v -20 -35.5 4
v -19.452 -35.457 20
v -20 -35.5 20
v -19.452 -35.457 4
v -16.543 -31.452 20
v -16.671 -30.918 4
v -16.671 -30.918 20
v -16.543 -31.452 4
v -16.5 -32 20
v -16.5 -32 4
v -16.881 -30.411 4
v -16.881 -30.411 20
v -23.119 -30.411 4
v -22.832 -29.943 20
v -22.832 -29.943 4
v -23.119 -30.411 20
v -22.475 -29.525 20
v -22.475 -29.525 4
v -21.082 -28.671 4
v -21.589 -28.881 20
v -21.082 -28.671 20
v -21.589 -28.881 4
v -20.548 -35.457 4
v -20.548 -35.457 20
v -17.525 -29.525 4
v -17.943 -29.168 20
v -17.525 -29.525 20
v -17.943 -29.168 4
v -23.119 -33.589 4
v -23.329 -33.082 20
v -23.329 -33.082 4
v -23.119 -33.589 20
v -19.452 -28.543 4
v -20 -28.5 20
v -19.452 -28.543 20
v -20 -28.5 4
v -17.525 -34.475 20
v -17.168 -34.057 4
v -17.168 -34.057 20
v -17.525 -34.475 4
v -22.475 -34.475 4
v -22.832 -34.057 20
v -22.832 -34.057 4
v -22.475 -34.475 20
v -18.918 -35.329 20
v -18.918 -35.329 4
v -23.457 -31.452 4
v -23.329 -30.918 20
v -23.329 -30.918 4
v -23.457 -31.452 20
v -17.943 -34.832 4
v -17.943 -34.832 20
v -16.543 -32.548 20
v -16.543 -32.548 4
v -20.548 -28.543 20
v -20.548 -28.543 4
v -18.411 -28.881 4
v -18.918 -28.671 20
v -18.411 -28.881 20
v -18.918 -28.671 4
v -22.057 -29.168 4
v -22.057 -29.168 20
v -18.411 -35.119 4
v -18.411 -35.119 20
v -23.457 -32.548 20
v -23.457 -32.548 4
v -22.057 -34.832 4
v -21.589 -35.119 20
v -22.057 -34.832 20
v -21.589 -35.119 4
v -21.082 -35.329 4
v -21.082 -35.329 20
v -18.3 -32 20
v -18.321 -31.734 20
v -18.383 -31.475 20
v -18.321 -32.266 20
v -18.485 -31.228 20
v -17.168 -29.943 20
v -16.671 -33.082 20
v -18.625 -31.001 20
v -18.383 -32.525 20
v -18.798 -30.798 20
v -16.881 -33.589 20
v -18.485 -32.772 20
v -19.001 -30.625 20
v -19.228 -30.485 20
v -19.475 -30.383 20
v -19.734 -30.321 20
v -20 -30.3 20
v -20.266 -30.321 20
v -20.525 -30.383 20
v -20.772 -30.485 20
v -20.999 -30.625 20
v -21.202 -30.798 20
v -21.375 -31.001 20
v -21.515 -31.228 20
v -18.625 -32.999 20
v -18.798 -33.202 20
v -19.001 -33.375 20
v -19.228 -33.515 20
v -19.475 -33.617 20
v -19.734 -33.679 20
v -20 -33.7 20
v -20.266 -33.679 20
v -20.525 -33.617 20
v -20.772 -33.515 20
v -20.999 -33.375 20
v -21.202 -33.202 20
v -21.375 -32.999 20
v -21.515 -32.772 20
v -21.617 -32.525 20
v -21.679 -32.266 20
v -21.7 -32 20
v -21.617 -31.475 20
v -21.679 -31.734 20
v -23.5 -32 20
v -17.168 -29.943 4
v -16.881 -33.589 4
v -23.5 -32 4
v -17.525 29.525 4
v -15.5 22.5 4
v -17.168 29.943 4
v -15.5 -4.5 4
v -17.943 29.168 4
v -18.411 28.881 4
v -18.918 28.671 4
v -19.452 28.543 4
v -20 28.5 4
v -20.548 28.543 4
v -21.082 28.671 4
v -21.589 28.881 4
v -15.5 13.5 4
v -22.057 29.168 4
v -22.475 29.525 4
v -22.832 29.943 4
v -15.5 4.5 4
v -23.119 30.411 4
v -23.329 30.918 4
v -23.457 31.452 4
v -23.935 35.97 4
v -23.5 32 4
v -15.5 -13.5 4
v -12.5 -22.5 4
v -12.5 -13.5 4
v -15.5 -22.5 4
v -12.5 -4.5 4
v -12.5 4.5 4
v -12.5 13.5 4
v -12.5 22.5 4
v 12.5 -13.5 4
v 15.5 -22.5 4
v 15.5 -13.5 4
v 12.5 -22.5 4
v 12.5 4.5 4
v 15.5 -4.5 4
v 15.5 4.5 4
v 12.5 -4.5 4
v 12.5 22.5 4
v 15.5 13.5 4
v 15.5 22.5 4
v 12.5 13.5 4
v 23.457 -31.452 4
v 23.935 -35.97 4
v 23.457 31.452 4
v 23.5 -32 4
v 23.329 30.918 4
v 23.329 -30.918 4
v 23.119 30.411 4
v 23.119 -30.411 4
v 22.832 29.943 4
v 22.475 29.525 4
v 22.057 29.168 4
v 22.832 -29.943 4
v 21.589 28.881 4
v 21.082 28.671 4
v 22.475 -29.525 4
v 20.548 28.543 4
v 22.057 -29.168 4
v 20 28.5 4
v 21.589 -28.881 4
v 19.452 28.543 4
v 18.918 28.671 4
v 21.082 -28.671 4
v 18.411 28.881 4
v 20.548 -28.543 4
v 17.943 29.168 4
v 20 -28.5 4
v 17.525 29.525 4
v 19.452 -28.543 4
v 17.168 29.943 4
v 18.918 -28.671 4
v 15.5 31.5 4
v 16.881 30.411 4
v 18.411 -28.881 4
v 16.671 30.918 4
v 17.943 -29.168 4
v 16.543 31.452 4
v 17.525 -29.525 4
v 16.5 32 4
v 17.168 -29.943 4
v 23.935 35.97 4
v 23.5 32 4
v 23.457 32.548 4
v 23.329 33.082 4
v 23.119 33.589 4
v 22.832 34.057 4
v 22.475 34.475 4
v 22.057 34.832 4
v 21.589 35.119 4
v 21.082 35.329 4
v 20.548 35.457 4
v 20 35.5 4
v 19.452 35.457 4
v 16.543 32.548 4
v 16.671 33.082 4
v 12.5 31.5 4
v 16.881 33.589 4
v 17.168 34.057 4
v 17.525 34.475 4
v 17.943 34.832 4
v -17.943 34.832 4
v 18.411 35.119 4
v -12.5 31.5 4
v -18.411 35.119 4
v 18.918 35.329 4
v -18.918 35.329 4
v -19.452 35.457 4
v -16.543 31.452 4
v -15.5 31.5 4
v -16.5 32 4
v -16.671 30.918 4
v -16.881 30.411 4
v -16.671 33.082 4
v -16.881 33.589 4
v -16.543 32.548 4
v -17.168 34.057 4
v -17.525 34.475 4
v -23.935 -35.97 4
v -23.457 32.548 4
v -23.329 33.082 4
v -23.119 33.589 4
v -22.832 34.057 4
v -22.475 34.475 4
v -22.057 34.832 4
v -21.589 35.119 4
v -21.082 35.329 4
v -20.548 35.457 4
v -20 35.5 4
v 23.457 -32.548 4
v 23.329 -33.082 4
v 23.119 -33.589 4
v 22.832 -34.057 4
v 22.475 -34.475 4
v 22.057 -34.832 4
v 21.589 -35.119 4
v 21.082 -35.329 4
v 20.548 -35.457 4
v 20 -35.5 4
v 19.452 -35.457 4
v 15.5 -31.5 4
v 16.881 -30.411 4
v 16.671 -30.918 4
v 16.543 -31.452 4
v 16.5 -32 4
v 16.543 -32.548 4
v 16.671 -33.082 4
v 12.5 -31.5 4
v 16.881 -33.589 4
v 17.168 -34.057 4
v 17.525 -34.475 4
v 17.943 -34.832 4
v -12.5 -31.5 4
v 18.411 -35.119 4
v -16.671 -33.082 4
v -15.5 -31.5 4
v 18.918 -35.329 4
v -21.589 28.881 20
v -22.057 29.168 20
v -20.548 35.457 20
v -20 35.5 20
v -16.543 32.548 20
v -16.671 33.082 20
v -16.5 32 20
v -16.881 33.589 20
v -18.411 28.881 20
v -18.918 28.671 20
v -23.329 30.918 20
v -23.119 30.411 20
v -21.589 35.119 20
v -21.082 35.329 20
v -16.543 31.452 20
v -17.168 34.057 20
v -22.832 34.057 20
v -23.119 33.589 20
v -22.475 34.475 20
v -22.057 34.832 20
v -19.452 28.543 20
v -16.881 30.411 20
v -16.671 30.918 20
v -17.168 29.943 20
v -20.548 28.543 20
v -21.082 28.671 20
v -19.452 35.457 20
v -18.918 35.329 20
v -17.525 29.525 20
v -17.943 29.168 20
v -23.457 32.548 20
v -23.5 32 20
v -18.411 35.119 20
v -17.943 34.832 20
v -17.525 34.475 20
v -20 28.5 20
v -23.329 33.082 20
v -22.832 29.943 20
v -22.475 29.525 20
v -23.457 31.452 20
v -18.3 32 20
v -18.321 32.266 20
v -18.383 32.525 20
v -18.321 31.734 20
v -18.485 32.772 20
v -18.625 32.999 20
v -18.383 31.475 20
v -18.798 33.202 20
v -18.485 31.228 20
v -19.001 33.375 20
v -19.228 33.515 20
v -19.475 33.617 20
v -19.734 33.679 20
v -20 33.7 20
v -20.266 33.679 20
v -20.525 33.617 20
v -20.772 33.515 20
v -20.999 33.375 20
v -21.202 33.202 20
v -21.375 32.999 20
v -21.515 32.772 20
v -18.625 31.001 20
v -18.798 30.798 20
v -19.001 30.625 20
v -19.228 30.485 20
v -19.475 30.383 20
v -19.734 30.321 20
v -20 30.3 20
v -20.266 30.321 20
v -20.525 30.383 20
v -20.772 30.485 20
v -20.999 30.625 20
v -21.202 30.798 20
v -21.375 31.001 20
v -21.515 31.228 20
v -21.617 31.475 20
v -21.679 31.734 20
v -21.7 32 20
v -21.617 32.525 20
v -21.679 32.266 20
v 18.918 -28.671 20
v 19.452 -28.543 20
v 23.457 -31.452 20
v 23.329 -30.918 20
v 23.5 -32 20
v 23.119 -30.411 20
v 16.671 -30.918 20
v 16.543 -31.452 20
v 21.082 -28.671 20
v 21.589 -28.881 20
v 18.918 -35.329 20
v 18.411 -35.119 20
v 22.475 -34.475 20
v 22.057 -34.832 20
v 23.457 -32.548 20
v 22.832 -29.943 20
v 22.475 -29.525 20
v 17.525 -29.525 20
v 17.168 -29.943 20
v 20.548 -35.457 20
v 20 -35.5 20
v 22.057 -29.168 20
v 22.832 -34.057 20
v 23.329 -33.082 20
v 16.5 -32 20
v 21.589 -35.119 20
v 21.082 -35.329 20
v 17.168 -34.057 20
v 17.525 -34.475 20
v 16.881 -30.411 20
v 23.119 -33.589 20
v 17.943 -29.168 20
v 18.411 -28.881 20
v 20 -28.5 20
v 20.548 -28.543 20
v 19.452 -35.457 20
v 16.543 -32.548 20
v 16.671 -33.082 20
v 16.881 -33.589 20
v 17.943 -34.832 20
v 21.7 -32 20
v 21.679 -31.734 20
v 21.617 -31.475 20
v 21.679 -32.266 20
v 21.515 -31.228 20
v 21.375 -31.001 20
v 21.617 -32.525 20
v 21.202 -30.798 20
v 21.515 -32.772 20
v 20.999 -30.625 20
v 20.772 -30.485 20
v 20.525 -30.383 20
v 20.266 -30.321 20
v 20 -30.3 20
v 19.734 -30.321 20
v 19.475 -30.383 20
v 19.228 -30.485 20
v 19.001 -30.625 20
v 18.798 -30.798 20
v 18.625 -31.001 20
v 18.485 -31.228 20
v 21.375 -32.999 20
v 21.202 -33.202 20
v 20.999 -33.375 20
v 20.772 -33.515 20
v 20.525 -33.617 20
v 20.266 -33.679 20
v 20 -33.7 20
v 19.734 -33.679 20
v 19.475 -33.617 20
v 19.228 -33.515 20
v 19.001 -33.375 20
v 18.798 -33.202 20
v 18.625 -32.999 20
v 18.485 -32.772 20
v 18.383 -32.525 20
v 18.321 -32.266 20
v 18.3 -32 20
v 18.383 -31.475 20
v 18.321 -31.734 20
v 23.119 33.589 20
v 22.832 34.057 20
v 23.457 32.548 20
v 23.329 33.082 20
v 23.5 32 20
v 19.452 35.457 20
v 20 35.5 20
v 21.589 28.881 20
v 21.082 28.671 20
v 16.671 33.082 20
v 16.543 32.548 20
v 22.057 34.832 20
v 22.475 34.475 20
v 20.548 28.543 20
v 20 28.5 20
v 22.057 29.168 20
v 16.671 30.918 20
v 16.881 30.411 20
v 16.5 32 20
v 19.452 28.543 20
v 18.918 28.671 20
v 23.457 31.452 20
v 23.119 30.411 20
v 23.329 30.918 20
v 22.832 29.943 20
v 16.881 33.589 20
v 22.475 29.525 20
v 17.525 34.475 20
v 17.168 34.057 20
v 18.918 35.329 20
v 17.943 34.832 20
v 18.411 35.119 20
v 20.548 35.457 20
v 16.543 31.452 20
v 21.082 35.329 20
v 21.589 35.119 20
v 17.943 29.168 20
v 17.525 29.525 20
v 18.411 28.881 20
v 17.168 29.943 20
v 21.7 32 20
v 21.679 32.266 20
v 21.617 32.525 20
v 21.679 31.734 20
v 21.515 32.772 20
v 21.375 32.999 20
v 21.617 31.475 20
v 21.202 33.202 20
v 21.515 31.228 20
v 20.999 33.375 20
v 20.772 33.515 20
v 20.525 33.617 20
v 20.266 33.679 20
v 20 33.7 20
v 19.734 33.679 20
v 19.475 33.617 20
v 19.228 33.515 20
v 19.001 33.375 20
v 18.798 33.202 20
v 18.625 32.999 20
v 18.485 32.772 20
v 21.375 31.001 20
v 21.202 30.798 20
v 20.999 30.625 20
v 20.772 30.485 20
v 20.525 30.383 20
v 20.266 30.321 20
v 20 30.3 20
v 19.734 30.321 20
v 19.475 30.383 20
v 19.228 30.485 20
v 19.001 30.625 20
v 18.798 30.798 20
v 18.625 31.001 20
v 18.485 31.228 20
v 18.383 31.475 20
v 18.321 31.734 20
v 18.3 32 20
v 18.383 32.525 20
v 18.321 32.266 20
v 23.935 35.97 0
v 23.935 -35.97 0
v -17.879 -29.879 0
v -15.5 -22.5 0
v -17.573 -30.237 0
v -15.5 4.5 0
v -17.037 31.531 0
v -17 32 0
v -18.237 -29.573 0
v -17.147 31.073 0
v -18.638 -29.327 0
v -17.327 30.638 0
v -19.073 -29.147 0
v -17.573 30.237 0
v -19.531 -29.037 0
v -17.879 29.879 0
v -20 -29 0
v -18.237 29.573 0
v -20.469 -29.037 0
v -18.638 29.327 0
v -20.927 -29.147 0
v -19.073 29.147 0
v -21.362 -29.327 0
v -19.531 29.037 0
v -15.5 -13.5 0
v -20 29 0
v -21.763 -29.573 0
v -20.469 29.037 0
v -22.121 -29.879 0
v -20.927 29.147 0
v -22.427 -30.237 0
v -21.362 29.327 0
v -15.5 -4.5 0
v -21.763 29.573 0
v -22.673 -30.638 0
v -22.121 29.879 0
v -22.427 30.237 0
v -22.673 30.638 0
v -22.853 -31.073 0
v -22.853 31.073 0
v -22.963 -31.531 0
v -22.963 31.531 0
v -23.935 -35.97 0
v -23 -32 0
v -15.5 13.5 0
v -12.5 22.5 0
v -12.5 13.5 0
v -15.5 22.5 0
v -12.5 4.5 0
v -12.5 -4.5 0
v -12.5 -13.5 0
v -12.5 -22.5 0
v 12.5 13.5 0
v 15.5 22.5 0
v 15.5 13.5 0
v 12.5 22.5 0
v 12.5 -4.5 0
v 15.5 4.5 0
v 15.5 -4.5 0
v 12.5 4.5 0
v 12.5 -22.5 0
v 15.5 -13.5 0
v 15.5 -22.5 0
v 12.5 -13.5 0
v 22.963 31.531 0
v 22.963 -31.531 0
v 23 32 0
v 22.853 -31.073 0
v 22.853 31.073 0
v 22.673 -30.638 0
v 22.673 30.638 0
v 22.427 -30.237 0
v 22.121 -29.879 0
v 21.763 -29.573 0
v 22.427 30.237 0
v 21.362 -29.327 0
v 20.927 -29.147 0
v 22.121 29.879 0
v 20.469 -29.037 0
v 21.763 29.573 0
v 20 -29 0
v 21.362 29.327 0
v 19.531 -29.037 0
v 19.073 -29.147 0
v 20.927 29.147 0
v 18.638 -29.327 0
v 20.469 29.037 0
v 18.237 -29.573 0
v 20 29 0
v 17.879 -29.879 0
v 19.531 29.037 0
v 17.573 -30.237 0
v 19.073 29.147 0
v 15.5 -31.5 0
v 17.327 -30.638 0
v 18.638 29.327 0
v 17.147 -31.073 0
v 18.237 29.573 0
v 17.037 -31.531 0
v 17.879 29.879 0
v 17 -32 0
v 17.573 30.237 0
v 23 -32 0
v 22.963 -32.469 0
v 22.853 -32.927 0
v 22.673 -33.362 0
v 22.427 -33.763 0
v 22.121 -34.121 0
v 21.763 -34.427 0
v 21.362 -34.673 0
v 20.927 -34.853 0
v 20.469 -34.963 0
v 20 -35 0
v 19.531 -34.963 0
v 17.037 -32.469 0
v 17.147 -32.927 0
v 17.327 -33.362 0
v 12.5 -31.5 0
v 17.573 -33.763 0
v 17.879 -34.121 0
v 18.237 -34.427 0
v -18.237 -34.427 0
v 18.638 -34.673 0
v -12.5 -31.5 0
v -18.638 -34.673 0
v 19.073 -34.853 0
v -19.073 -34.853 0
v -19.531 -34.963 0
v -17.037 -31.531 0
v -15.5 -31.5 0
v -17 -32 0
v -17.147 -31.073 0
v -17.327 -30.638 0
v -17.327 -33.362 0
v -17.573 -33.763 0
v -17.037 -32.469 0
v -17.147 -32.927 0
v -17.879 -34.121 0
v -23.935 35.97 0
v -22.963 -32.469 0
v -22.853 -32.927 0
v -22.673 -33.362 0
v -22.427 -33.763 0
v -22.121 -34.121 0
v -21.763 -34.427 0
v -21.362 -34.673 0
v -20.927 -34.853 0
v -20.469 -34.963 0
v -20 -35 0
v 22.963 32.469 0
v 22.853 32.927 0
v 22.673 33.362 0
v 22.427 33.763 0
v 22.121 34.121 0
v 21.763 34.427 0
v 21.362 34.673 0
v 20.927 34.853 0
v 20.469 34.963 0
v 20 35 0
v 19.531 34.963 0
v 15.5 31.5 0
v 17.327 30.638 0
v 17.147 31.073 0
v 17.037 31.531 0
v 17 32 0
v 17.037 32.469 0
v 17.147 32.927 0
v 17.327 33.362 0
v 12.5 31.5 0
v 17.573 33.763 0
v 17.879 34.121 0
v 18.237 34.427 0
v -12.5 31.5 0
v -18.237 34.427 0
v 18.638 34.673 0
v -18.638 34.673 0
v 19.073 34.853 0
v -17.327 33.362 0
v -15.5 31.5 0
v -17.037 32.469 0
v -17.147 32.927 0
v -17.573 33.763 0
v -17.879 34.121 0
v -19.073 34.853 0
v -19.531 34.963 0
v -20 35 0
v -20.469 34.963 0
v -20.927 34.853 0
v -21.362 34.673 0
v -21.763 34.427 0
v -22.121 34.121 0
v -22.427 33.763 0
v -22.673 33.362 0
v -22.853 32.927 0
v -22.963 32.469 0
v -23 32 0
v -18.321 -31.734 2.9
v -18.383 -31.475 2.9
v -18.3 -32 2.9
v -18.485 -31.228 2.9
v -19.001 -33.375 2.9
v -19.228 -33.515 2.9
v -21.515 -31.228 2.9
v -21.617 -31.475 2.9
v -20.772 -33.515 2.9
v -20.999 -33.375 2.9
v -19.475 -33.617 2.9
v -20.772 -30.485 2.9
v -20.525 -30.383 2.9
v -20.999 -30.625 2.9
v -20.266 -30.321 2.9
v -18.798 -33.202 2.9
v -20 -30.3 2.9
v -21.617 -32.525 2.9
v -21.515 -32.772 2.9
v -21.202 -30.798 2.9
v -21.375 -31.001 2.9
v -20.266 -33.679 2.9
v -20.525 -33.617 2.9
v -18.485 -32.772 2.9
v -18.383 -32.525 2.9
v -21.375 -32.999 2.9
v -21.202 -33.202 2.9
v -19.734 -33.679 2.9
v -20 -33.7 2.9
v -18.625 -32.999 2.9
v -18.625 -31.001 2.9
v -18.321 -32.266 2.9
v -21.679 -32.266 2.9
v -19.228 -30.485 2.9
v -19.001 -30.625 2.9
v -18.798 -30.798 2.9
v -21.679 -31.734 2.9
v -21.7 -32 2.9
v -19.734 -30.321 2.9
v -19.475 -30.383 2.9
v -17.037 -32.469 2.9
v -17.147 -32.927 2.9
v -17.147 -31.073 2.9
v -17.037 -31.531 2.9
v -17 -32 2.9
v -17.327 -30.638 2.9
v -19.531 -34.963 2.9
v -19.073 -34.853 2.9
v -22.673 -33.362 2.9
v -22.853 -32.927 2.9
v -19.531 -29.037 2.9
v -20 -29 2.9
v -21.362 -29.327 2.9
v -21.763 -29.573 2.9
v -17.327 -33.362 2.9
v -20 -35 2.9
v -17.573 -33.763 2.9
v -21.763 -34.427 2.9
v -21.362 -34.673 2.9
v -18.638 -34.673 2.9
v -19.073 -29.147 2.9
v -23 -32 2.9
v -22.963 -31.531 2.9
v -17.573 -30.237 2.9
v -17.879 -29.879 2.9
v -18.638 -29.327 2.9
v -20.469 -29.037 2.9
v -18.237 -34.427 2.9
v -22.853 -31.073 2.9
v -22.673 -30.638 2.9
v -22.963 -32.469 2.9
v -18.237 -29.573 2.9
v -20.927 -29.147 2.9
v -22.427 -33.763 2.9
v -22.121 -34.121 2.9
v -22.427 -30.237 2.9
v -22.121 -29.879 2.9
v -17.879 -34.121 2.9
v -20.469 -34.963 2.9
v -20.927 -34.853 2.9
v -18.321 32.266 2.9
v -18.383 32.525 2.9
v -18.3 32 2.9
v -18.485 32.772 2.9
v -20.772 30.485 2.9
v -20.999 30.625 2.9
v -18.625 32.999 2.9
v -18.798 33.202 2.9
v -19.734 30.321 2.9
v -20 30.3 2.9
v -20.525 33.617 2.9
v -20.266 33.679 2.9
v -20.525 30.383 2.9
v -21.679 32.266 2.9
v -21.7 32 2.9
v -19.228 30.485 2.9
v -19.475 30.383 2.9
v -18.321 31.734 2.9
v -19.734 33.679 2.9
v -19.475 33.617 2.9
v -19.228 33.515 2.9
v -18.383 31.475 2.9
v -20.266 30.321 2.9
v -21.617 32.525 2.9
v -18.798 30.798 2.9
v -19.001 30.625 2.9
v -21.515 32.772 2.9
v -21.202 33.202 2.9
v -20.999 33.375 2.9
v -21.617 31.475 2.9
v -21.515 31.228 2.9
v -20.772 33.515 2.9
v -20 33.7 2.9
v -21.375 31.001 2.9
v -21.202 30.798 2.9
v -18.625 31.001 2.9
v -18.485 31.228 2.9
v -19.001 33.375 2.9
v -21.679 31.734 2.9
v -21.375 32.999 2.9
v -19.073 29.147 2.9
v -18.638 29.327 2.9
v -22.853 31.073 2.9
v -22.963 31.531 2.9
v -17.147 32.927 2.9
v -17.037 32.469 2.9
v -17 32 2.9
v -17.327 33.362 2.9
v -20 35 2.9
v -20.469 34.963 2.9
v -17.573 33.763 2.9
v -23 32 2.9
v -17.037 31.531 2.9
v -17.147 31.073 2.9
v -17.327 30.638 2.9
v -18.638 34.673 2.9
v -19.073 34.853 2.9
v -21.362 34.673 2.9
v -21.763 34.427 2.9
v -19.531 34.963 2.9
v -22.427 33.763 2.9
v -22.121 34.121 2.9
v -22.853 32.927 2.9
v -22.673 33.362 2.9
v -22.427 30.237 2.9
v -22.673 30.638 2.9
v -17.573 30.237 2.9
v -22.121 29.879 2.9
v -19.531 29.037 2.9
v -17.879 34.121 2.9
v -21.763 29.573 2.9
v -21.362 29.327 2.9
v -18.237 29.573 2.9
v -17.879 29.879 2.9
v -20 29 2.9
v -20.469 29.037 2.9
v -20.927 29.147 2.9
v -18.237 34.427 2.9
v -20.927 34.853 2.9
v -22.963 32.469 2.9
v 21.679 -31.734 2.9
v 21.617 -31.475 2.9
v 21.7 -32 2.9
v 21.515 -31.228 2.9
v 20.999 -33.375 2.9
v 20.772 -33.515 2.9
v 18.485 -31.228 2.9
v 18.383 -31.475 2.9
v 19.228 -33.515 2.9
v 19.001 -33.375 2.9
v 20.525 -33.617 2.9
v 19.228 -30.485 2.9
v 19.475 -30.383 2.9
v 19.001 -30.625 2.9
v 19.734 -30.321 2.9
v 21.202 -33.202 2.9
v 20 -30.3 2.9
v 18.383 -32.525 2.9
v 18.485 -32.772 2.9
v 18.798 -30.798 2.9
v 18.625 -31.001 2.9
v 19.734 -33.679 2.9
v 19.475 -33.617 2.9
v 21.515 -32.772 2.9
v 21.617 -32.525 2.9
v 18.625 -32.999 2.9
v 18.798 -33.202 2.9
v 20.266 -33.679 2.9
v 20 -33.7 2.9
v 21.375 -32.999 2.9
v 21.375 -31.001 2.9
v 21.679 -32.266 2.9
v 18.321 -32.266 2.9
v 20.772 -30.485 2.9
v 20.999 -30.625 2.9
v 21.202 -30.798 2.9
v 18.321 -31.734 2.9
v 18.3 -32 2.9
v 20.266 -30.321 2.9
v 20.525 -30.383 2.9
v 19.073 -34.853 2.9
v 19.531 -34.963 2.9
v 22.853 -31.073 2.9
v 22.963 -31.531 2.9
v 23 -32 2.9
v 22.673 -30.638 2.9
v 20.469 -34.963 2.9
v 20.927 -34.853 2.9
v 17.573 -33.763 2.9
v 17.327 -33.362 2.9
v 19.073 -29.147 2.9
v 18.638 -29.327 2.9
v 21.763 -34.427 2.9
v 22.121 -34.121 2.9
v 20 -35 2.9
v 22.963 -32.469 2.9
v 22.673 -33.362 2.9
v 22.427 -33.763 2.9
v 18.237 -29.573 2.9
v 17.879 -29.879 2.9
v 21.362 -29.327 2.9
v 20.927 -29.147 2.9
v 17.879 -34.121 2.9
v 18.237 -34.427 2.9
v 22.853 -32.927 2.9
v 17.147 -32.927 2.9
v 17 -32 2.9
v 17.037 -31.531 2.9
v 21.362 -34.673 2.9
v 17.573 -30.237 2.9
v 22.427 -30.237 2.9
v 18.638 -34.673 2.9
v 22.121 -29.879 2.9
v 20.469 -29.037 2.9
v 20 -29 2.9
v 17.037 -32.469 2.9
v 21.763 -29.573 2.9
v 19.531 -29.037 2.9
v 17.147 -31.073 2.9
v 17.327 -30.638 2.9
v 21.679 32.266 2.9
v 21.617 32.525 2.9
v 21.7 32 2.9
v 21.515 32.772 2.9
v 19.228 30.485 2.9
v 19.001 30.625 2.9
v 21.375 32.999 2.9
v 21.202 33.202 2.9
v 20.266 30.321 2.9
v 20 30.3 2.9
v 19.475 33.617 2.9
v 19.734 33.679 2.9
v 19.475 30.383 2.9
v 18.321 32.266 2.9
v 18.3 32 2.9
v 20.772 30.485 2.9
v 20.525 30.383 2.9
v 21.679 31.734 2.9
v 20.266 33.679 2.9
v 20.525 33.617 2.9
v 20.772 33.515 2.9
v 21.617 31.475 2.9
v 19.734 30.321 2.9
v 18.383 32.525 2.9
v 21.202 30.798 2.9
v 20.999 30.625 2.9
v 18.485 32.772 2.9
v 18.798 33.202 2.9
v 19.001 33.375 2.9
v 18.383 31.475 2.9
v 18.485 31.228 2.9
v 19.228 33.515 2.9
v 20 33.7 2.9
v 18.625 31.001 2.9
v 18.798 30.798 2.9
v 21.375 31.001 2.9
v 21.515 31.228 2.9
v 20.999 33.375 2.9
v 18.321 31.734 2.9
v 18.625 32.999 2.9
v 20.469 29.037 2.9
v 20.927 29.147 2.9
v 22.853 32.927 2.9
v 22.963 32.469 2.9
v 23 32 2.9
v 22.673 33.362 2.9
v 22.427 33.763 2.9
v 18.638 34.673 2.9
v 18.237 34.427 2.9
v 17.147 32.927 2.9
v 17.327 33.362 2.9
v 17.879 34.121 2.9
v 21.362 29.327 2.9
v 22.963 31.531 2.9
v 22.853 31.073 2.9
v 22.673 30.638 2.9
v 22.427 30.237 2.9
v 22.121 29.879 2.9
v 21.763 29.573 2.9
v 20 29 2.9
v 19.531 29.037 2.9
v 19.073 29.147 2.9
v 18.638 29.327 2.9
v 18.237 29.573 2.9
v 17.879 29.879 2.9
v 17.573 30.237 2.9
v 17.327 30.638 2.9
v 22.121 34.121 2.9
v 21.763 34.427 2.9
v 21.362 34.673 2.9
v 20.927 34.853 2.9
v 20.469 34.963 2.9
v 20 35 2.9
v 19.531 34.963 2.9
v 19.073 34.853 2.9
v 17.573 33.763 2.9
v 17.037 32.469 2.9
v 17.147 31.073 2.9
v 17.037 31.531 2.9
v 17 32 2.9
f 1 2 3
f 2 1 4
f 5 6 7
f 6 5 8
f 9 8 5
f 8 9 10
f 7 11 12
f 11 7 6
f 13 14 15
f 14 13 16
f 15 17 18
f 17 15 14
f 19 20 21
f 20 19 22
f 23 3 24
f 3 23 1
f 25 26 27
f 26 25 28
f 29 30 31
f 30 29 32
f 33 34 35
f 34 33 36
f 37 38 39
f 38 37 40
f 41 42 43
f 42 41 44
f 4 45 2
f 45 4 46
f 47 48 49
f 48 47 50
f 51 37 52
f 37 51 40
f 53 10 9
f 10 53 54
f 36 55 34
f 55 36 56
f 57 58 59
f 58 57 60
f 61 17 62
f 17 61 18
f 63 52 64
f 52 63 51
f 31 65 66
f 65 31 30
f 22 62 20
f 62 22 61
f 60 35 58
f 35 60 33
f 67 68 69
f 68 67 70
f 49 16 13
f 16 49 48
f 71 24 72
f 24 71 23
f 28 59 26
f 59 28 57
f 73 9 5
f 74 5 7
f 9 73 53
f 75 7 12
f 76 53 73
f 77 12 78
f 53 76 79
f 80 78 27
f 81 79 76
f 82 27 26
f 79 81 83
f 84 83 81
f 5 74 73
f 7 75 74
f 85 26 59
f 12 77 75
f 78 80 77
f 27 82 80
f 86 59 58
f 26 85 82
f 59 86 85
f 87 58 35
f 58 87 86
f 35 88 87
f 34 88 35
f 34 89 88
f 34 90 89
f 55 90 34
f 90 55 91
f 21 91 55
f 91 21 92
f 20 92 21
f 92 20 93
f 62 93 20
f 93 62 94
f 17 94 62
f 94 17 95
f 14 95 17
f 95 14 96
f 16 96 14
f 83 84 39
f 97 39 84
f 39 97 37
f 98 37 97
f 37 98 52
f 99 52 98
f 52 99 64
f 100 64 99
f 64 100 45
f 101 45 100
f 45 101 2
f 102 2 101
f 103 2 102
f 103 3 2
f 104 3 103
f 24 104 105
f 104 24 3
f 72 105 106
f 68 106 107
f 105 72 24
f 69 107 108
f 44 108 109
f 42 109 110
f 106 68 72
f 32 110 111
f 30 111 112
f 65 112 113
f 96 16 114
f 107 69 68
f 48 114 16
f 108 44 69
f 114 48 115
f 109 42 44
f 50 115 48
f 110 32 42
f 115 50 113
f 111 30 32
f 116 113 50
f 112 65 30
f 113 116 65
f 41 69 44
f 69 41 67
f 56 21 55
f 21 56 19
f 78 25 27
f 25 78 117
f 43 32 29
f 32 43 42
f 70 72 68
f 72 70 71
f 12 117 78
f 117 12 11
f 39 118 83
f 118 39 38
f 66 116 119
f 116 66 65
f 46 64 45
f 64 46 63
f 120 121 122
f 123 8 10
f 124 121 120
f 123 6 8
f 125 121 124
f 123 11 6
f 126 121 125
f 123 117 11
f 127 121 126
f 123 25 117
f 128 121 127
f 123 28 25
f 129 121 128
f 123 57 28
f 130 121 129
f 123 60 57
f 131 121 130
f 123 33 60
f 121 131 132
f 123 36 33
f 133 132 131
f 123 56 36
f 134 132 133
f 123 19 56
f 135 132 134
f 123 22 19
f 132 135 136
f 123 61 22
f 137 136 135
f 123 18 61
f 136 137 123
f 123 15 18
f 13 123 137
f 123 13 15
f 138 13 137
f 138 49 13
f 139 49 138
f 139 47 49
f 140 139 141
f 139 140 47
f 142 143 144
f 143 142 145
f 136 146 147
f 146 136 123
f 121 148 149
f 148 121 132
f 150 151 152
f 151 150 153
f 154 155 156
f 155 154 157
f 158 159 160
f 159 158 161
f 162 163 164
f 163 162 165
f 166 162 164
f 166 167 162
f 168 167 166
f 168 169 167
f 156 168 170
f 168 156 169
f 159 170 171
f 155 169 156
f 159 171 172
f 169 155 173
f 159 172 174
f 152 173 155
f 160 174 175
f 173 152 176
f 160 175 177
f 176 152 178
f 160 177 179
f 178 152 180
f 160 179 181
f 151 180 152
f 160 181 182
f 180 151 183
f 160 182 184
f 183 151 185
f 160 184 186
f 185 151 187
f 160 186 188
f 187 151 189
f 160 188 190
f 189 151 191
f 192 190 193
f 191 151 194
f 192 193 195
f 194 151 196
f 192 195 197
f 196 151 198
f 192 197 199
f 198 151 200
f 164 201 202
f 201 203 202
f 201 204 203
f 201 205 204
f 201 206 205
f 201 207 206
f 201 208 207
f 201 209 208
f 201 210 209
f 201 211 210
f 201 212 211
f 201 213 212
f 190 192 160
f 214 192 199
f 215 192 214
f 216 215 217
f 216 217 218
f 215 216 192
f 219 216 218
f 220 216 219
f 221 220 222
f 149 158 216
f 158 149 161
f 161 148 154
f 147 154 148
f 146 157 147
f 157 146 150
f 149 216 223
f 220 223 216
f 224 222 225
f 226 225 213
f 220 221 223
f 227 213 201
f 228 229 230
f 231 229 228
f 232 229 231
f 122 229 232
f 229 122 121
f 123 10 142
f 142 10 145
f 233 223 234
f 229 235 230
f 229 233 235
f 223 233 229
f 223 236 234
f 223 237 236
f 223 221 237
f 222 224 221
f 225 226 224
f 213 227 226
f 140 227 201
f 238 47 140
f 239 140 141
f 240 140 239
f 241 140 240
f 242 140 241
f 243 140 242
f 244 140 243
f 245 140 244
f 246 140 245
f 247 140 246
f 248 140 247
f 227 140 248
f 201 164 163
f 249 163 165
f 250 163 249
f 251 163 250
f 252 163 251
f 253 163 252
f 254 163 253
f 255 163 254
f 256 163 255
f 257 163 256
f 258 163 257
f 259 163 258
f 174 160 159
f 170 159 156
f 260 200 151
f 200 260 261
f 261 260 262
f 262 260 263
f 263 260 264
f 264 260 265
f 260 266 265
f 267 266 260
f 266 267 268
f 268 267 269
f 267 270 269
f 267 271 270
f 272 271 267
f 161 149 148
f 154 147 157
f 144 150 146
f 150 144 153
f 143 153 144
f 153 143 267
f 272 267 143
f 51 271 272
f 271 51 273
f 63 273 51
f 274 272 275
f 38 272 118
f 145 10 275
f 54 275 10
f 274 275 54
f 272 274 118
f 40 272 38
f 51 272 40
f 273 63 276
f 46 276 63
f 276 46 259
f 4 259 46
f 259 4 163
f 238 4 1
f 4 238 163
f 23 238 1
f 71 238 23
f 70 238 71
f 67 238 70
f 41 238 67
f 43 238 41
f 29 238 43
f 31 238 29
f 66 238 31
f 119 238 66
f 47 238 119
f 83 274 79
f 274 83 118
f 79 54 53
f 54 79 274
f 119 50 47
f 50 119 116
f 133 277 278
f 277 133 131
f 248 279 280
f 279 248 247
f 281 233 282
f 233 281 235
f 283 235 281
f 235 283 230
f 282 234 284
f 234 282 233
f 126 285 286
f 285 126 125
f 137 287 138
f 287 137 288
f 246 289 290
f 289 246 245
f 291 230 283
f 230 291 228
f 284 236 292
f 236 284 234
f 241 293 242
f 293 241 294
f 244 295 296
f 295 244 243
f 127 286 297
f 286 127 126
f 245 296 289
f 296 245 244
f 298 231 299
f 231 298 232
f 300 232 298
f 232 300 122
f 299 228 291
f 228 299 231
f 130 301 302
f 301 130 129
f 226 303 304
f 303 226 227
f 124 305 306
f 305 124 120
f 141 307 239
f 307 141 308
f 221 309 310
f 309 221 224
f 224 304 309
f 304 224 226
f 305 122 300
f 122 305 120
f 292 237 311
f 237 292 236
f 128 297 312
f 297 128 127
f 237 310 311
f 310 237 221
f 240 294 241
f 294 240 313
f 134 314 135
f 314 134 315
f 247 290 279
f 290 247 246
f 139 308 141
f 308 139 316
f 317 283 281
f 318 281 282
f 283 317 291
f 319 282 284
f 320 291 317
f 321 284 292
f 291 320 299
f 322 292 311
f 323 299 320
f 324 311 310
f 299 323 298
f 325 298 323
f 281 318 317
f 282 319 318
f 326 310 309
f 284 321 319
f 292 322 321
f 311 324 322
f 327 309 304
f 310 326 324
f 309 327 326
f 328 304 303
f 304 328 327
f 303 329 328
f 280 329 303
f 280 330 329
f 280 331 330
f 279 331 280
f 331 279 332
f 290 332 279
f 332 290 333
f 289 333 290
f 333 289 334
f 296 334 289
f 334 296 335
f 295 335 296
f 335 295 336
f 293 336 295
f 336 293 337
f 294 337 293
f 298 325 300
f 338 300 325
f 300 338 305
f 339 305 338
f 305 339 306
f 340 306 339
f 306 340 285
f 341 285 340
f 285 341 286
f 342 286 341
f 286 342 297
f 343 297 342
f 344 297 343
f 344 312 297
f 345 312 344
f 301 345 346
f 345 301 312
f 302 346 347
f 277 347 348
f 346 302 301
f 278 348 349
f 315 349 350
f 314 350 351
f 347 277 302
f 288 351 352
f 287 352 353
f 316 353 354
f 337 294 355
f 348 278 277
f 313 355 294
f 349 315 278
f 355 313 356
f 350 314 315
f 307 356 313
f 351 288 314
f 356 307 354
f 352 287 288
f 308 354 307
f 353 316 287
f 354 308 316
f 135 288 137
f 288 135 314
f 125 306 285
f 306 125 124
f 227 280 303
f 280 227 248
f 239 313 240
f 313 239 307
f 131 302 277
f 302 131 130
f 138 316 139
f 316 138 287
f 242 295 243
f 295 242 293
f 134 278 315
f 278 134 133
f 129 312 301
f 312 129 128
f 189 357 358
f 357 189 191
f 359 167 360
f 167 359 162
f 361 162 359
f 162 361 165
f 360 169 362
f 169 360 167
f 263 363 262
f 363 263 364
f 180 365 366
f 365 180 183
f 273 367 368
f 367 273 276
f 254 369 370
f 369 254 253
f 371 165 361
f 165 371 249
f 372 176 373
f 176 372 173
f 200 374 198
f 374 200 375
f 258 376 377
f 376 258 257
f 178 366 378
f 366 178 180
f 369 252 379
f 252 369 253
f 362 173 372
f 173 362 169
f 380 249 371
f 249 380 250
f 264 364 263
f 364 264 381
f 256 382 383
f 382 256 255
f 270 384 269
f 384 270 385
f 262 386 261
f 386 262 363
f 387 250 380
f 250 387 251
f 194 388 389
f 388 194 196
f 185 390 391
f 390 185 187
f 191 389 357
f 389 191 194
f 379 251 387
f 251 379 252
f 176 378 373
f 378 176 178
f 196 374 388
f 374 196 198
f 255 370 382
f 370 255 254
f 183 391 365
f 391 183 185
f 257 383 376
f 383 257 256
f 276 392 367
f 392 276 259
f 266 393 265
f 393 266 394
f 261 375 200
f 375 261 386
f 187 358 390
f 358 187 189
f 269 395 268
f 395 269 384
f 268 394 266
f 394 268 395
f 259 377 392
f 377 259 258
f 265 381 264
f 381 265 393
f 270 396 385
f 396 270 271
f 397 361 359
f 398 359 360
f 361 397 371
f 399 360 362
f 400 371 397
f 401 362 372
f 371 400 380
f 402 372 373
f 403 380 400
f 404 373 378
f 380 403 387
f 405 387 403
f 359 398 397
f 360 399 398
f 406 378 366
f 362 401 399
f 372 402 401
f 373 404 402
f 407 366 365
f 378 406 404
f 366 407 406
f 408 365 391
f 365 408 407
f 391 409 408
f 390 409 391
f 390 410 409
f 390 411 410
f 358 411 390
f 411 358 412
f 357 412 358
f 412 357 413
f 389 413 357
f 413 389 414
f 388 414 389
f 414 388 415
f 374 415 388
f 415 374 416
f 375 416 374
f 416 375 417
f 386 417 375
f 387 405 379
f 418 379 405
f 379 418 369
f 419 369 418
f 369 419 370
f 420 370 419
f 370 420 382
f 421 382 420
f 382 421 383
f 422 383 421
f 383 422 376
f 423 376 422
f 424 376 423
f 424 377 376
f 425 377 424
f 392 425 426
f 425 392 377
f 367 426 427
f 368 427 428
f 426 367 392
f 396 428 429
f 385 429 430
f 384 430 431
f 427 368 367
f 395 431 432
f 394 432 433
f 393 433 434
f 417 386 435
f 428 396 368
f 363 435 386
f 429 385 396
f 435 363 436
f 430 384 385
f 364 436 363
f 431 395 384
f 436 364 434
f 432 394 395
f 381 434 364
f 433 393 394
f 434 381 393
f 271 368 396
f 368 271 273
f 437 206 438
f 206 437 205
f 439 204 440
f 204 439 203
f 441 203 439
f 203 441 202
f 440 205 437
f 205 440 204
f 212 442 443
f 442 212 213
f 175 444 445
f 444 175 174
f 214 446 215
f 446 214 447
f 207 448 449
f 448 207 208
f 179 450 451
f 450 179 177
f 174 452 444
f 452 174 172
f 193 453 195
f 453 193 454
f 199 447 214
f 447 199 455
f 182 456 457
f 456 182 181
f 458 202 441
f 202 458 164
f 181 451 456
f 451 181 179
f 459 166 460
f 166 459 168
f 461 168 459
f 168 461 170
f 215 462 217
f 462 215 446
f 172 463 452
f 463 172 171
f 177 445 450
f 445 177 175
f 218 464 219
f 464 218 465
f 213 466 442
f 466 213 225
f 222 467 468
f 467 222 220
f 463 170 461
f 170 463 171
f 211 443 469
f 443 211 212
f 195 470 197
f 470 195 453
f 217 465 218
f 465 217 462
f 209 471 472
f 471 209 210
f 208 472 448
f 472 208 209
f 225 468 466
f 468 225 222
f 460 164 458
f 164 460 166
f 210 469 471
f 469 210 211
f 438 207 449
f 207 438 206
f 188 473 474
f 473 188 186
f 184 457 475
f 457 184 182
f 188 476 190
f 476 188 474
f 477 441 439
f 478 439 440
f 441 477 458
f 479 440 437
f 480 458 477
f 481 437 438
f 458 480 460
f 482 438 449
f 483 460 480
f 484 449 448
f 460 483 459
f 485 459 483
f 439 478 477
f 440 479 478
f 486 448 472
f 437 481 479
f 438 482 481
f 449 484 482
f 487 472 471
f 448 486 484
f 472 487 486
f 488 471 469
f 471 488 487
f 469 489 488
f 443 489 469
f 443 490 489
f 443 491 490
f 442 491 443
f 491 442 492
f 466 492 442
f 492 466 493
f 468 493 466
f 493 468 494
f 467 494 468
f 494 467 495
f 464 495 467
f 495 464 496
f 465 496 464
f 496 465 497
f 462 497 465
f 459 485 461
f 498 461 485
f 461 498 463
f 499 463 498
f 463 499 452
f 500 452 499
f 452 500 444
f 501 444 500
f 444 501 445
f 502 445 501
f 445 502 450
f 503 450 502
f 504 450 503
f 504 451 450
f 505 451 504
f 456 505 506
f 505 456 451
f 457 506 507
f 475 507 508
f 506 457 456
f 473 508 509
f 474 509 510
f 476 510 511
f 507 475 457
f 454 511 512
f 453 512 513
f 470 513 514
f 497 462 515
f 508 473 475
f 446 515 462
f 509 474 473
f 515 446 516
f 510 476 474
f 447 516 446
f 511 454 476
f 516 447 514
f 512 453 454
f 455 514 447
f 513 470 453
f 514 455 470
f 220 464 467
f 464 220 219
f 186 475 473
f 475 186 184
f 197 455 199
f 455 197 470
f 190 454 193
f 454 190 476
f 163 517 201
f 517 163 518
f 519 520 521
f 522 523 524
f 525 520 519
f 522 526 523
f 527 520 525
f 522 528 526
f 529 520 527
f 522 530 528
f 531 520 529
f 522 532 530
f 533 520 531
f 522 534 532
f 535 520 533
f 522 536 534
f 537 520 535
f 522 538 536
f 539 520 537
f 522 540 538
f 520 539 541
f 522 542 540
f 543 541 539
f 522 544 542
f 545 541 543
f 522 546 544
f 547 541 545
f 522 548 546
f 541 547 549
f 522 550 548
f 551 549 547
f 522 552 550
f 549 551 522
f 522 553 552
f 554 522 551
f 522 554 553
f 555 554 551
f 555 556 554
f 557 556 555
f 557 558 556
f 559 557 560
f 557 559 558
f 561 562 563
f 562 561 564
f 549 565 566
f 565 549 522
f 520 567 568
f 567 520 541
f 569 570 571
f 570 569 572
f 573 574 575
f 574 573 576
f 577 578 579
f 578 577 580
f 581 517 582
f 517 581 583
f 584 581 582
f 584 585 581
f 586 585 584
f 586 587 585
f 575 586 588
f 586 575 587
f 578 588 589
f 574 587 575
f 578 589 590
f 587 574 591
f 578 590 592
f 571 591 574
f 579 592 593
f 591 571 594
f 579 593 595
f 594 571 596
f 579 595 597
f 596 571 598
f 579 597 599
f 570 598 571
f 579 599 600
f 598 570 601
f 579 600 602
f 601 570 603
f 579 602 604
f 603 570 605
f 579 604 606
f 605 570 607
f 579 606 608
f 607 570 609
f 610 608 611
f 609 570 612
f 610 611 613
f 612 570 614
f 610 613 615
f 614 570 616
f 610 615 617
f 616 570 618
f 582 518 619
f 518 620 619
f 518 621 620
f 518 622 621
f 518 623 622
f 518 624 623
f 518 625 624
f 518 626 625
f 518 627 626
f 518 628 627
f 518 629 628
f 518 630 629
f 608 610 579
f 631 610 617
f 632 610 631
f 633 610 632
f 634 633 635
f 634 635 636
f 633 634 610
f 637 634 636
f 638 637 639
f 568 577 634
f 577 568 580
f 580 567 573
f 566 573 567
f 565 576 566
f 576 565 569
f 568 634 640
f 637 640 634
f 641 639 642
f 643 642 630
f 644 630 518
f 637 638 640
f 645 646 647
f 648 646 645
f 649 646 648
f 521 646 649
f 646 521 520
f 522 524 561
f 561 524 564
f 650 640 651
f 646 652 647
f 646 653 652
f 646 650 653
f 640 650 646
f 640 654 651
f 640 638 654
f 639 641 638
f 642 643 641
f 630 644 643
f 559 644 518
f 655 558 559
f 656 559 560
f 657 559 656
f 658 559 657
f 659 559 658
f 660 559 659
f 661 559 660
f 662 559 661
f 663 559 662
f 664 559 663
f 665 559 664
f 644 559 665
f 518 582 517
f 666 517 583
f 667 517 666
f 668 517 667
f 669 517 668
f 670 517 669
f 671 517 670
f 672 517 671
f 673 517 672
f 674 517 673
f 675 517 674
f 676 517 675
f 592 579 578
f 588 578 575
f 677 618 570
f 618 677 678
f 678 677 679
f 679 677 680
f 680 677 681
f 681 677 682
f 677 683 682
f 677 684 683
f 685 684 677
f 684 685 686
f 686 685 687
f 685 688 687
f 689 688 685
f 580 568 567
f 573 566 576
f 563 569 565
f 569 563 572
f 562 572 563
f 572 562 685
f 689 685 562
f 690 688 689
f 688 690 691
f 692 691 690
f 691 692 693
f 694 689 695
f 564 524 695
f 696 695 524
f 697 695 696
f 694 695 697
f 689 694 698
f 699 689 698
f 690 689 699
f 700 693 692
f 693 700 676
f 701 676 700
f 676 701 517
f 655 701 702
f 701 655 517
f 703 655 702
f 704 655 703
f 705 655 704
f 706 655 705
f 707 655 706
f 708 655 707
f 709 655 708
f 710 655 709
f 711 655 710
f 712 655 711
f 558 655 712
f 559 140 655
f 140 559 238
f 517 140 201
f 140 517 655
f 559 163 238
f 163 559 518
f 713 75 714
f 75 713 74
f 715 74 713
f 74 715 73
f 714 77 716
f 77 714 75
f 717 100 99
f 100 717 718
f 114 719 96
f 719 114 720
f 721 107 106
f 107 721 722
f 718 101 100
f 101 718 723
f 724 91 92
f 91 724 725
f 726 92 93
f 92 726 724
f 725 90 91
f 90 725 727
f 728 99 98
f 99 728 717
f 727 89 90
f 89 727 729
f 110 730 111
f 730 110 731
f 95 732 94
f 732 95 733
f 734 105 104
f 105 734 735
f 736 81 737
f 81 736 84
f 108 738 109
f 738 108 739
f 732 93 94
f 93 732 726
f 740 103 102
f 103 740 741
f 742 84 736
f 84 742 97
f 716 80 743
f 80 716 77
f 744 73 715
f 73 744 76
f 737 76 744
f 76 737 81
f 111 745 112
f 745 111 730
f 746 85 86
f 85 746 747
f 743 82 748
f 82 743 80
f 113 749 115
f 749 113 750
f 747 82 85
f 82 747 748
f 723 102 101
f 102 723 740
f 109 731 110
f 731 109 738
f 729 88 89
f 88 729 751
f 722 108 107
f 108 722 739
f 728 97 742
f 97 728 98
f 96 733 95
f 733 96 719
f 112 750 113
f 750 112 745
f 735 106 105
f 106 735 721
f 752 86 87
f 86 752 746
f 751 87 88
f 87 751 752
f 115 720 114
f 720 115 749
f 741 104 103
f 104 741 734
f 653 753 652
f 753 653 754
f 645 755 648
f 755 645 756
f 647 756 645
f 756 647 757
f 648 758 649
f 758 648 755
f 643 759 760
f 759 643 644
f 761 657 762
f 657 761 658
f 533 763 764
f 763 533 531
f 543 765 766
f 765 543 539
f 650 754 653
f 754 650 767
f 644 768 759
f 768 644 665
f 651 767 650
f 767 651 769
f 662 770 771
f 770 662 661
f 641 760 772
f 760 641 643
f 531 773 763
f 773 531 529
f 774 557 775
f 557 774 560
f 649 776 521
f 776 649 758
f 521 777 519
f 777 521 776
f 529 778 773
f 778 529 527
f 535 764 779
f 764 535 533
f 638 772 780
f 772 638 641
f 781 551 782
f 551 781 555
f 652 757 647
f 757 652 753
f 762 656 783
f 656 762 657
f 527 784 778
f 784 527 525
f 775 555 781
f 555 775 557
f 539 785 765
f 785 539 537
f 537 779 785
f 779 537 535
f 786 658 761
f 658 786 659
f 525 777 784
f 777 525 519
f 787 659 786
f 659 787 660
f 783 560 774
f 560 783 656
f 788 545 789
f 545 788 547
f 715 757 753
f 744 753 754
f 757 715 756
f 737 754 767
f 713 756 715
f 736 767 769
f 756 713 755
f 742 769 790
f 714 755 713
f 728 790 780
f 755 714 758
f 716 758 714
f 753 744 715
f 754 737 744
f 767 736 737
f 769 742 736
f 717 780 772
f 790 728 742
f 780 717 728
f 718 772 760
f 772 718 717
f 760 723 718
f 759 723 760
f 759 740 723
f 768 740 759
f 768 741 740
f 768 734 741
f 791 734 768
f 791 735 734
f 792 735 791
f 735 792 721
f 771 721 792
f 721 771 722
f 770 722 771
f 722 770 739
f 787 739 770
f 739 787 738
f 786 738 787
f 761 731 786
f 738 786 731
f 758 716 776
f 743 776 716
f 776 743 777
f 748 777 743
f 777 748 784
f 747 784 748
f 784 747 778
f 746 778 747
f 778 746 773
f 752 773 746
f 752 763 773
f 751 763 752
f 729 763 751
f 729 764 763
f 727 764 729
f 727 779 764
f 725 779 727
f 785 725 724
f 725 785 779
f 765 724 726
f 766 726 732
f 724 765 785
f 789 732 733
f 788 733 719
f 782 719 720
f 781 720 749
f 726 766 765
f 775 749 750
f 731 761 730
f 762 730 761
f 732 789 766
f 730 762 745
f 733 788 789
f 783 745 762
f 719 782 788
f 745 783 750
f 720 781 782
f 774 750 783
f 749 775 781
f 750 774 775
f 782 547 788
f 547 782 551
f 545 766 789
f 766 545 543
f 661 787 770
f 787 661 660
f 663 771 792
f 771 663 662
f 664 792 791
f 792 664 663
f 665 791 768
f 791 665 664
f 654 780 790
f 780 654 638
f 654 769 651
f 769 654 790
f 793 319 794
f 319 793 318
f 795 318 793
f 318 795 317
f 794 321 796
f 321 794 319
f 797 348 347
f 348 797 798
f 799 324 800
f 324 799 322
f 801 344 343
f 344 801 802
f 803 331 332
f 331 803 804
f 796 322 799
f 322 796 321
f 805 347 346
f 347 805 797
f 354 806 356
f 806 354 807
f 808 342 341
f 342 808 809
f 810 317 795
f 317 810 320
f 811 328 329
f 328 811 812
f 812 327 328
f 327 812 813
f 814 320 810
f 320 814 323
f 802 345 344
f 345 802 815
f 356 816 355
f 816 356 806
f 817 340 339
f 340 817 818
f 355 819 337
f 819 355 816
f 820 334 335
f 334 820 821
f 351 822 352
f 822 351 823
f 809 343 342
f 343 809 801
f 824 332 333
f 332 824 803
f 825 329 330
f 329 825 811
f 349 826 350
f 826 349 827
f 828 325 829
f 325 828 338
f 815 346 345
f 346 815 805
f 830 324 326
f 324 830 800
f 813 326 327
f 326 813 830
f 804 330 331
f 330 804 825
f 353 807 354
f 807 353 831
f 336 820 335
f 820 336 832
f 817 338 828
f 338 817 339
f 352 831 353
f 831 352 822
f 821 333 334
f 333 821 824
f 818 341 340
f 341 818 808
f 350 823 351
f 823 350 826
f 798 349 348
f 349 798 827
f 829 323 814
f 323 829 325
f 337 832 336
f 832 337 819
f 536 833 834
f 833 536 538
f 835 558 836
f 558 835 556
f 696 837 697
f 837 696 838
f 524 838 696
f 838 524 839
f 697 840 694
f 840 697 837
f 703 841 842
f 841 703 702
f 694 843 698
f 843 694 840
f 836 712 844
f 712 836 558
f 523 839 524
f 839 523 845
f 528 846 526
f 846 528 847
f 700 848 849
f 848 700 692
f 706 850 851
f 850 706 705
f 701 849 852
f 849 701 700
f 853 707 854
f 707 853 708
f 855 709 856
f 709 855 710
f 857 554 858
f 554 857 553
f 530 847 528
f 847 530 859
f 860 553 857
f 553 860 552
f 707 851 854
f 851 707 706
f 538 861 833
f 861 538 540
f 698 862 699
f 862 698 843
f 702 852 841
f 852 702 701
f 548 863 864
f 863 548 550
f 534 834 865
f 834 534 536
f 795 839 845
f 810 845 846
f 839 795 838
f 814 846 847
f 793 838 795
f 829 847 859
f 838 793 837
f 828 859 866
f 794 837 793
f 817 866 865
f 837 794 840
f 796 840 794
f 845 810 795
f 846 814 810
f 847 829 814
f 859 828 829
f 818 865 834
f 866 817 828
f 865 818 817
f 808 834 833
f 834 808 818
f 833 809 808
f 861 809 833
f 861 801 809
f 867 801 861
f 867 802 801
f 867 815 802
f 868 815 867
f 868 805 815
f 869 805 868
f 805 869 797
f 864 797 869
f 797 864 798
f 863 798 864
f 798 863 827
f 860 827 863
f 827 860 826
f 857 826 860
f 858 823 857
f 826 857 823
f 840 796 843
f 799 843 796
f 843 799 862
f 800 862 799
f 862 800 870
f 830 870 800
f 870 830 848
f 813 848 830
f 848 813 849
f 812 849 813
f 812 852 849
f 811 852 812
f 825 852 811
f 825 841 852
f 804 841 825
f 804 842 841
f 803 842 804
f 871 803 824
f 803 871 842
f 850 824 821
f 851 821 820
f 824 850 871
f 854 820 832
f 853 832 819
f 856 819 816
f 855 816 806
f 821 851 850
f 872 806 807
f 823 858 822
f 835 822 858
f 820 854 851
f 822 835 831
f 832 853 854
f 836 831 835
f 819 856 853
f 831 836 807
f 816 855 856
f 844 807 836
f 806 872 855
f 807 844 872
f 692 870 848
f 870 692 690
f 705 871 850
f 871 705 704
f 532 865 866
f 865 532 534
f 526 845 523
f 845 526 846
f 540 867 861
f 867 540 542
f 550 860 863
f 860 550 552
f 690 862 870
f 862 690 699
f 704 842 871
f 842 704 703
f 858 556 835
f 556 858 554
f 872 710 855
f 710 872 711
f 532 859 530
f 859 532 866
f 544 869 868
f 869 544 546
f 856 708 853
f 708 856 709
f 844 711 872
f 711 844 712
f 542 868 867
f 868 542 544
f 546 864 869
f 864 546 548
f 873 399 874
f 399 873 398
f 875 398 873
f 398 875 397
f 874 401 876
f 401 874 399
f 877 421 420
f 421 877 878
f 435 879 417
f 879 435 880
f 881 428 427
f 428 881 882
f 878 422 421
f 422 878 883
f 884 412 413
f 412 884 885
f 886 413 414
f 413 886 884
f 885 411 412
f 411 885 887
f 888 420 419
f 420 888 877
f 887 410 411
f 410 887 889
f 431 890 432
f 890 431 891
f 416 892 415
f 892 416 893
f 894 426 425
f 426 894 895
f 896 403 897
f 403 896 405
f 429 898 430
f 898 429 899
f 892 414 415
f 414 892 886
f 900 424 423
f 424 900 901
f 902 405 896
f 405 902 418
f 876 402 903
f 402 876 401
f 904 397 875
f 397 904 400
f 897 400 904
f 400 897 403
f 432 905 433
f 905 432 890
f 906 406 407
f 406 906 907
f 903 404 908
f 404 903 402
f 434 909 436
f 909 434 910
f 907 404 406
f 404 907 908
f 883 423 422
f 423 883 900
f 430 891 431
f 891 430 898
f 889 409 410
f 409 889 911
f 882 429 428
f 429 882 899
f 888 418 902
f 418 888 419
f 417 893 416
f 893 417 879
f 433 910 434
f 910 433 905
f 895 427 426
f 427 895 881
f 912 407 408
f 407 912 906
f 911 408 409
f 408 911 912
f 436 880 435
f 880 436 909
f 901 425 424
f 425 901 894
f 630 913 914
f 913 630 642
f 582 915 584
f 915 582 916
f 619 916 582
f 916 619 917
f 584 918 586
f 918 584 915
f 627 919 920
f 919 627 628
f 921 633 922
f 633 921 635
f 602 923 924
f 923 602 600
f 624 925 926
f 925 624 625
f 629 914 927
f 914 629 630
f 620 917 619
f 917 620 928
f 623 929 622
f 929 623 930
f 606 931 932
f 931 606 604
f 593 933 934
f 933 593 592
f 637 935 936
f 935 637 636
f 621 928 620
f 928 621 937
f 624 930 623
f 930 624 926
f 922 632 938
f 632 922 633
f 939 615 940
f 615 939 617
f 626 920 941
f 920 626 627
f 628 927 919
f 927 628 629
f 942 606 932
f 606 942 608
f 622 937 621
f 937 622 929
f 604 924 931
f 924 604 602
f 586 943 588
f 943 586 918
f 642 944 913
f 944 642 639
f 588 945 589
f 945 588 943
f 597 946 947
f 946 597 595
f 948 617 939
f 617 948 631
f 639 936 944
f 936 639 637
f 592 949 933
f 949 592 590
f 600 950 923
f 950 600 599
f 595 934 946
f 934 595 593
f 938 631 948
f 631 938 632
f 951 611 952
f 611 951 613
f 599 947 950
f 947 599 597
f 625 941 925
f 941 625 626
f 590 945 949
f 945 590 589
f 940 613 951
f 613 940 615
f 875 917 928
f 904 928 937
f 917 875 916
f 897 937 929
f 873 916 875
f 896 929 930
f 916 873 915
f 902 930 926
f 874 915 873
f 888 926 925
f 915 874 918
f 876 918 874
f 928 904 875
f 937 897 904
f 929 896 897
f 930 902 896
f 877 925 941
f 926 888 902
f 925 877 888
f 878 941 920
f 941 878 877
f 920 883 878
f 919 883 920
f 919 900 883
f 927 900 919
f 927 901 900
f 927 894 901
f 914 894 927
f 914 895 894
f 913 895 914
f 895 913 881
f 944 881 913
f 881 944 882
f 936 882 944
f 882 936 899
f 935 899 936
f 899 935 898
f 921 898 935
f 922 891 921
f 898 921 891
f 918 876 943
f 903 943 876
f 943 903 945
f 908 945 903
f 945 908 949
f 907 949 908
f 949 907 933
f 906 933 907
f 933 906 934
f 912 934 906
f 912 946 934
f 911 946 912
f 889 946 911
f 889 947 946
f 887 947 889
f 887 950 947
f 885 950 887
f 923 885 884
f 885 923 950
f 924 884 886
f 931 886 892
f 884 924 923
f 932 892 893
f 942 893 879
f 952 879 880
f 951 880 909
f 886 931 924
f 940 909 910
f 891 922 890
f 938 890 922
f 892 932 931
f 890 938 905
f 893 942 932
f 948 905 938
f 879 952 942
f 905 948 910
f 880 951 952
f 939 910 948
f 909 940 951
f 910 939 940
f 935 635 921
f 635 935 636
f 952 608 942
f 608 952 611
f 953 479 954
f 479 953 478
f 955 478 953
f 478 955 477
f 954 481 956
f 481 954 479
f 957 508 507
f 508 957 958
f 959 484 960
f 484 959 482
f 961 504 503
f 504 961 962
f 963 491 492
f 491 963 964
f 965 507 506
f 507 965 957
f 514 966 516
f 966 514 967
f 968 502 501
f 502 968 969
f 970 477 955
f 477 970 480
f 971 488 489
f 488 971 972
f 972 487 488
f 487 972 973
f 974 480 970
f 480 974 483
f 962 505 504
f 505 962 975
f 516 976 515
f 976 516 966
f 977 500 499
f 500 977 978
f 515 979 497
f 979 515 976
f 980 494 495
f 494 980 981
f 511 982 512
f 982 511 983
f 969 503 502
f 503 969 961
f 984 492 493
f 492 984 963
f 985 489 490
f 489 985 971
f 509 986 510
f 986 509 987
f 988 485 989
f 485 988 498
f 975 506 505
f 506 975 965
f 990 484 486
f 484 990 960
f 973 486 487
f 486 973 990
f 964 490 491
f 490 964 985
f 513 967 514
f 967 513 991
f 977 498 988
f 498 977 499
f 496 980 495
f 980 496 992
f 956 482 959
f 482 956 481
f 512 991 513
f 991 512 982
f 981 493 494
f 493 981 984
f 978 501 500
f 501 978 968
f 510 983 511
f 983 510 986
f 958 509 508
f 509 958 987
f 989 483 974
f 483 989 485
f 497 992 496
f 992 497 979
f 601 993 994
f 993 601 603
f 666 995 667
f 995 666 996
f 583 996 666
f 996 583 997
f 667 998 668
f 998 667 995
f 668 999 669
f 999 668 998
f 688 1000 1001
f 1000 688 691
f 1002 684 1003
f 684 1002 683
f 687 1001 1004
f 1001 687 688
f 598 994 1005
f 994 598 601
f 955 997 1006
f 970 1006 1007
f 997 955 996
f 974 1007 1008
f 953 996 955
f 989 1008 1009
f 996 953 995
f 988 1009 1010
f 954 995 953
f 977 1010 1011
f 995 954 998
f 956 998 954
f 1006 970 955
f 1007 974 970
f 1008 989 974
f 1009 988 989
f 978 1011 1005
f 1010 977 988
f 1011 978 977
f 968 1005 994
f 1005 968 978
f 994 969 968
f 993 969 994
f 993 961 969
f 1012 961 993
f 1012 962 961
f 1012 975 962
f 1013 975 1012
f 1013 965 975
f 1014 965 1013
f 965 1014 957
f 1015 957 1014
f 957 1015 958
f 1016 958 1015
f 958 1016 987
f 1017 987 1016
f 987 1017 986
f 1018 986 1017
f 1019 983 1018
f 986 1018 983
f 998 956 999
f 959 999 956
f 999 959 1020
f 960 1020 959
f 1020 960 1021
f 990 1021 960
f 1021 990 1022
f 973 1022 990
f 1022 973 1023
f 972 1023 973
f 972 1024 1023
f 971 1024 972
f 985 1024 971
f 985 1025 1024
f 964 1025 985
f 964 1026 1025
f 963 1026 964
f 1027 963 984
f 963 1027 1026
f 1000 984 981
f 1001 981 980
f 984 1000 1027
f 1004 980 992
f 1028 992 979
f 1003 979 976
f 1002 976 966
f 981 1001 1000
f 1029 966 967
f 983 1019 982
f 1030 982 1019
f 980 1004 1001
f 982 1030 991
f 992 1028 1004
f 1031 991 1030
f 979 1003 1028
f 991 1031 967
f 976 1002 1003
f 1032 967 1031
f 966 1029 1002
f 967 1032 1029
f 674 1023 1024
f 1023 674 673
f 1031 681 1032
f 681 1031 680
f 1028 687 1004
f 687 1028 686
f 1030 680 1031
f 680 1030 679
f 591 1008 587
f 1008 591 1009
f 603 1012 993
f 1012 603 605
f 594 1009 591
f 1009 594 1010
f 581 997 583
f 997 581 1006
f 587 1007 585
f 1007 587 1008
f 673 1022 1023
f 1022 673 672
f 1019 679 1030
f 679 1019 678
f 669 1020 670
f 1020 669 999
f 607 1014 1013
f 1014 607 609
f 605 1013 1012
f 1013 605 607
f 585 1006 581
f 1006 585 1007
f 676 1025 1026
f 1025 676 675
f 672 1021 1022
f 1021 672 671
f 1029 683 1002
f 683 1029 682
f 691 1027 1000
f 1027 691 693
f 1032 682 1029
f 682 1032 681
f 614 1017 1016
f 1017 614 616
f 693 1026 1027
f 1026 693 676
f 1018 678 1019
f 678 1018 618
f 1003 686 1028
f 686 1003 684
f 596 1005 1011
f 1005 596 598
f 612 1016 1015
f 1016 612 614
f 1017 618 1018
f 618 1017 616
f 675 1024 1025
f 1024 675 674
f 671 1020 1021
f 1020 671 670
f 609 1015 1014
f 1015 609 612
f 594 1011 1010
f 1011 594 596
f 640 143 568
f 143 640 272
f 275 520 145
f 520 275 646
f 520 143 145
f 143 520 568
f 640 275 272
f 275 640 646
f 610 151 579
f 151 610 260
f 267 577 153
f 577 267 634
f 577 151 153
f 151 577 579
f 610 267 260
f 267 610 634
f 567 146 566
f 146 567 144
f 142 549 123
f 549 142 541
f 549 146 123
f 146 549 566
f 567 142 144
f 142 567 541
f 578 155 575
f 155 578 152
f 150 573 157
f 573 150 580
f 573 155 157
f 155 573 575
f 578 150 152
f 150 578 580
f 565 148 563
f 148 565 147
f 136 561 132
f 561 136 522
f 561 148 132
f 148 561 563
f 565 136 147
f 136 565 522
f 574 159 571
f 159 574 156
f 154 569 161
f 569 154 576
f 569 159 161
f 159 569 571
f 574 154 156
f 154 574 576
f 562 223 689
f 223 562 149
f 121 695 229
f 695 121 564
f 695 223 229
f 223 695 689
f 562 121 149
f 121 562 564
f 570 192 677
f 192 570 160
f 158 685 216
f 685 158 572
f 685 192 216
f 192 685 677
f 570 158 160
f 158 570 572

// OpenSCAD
// ============================================================================
// CyberWing — WAGO connector plate (side-mounted, vertical)
// Holds 4 WAGO splicing connectors in a vertical column. Mounts to a side
// frame's 4× M3 inserts (64 × 40 pattern) on 16 mm standoffs. Connectors
// retained by zip-ties through paired slots (universal). Print standoffs-up.
//   plate 71.94 (vertical / Y) × 47.87 (wide / X); connectors face the -Z front.
// ============================================================================
$fn = 40;

PW = 47.87; PH = 71.94; T = 4;                 // plate width(X), height(Y), thick(Z)
MNT_X = 40; MNT_Y = 64;                         // side-frame insert pattern (40 × 64)
SO_D = 7; SO_H = 16; SO_BORE = 3.4;             // 16 mm standoffs + M3 clearance
M3_CB_D = 6; M3_CB_H = 3;
CONN_Y = [-27, -9, 9, 27];                      // 4 connector centers up the column
ZT_X = 14; ZT_W = 3; ZT_L = 9;                  // zip-tie slot pair per connector

difference() {
  union() {
    translate([-PW/2, -PH/2, 0]) cube([PW, PH, T]);                       // plate
    for (sx=[-1,1], sy=[-1,1])                                            // 4 standoffs (back, +Z)
      translate([sx*MNT_X/2, sy*MNT_Y/2, T]) cylinder(d=SO_D, h=SO_H);
  }
  // M3 clearance through each standoff + plate, head counterbore on the front (z=0)
  for (sx=[-1,1], sy=[-1,1]) {
    translate([sx*MNT_X/2, sy*MNT_Y/2, -0.1]) cylinder(d=SO_BORE, h=T+SO_H+0.2);
    translate([sx*MNT_X/2, sy*MNT_Y/2, -0.1]) cylinder(d=M3_CB_D, h=M3_CB_H);
  }
  // zip-tie slot pairs (2 per connector, straddling it)
  for (cy=CONN_Y, sx=[-1,1])
    translate([sx*ZT_X - ZT_W/2, cy - ZT_L/2, -0.1]) cube([ZT_W, ZT_L, T+0.2]);
}
